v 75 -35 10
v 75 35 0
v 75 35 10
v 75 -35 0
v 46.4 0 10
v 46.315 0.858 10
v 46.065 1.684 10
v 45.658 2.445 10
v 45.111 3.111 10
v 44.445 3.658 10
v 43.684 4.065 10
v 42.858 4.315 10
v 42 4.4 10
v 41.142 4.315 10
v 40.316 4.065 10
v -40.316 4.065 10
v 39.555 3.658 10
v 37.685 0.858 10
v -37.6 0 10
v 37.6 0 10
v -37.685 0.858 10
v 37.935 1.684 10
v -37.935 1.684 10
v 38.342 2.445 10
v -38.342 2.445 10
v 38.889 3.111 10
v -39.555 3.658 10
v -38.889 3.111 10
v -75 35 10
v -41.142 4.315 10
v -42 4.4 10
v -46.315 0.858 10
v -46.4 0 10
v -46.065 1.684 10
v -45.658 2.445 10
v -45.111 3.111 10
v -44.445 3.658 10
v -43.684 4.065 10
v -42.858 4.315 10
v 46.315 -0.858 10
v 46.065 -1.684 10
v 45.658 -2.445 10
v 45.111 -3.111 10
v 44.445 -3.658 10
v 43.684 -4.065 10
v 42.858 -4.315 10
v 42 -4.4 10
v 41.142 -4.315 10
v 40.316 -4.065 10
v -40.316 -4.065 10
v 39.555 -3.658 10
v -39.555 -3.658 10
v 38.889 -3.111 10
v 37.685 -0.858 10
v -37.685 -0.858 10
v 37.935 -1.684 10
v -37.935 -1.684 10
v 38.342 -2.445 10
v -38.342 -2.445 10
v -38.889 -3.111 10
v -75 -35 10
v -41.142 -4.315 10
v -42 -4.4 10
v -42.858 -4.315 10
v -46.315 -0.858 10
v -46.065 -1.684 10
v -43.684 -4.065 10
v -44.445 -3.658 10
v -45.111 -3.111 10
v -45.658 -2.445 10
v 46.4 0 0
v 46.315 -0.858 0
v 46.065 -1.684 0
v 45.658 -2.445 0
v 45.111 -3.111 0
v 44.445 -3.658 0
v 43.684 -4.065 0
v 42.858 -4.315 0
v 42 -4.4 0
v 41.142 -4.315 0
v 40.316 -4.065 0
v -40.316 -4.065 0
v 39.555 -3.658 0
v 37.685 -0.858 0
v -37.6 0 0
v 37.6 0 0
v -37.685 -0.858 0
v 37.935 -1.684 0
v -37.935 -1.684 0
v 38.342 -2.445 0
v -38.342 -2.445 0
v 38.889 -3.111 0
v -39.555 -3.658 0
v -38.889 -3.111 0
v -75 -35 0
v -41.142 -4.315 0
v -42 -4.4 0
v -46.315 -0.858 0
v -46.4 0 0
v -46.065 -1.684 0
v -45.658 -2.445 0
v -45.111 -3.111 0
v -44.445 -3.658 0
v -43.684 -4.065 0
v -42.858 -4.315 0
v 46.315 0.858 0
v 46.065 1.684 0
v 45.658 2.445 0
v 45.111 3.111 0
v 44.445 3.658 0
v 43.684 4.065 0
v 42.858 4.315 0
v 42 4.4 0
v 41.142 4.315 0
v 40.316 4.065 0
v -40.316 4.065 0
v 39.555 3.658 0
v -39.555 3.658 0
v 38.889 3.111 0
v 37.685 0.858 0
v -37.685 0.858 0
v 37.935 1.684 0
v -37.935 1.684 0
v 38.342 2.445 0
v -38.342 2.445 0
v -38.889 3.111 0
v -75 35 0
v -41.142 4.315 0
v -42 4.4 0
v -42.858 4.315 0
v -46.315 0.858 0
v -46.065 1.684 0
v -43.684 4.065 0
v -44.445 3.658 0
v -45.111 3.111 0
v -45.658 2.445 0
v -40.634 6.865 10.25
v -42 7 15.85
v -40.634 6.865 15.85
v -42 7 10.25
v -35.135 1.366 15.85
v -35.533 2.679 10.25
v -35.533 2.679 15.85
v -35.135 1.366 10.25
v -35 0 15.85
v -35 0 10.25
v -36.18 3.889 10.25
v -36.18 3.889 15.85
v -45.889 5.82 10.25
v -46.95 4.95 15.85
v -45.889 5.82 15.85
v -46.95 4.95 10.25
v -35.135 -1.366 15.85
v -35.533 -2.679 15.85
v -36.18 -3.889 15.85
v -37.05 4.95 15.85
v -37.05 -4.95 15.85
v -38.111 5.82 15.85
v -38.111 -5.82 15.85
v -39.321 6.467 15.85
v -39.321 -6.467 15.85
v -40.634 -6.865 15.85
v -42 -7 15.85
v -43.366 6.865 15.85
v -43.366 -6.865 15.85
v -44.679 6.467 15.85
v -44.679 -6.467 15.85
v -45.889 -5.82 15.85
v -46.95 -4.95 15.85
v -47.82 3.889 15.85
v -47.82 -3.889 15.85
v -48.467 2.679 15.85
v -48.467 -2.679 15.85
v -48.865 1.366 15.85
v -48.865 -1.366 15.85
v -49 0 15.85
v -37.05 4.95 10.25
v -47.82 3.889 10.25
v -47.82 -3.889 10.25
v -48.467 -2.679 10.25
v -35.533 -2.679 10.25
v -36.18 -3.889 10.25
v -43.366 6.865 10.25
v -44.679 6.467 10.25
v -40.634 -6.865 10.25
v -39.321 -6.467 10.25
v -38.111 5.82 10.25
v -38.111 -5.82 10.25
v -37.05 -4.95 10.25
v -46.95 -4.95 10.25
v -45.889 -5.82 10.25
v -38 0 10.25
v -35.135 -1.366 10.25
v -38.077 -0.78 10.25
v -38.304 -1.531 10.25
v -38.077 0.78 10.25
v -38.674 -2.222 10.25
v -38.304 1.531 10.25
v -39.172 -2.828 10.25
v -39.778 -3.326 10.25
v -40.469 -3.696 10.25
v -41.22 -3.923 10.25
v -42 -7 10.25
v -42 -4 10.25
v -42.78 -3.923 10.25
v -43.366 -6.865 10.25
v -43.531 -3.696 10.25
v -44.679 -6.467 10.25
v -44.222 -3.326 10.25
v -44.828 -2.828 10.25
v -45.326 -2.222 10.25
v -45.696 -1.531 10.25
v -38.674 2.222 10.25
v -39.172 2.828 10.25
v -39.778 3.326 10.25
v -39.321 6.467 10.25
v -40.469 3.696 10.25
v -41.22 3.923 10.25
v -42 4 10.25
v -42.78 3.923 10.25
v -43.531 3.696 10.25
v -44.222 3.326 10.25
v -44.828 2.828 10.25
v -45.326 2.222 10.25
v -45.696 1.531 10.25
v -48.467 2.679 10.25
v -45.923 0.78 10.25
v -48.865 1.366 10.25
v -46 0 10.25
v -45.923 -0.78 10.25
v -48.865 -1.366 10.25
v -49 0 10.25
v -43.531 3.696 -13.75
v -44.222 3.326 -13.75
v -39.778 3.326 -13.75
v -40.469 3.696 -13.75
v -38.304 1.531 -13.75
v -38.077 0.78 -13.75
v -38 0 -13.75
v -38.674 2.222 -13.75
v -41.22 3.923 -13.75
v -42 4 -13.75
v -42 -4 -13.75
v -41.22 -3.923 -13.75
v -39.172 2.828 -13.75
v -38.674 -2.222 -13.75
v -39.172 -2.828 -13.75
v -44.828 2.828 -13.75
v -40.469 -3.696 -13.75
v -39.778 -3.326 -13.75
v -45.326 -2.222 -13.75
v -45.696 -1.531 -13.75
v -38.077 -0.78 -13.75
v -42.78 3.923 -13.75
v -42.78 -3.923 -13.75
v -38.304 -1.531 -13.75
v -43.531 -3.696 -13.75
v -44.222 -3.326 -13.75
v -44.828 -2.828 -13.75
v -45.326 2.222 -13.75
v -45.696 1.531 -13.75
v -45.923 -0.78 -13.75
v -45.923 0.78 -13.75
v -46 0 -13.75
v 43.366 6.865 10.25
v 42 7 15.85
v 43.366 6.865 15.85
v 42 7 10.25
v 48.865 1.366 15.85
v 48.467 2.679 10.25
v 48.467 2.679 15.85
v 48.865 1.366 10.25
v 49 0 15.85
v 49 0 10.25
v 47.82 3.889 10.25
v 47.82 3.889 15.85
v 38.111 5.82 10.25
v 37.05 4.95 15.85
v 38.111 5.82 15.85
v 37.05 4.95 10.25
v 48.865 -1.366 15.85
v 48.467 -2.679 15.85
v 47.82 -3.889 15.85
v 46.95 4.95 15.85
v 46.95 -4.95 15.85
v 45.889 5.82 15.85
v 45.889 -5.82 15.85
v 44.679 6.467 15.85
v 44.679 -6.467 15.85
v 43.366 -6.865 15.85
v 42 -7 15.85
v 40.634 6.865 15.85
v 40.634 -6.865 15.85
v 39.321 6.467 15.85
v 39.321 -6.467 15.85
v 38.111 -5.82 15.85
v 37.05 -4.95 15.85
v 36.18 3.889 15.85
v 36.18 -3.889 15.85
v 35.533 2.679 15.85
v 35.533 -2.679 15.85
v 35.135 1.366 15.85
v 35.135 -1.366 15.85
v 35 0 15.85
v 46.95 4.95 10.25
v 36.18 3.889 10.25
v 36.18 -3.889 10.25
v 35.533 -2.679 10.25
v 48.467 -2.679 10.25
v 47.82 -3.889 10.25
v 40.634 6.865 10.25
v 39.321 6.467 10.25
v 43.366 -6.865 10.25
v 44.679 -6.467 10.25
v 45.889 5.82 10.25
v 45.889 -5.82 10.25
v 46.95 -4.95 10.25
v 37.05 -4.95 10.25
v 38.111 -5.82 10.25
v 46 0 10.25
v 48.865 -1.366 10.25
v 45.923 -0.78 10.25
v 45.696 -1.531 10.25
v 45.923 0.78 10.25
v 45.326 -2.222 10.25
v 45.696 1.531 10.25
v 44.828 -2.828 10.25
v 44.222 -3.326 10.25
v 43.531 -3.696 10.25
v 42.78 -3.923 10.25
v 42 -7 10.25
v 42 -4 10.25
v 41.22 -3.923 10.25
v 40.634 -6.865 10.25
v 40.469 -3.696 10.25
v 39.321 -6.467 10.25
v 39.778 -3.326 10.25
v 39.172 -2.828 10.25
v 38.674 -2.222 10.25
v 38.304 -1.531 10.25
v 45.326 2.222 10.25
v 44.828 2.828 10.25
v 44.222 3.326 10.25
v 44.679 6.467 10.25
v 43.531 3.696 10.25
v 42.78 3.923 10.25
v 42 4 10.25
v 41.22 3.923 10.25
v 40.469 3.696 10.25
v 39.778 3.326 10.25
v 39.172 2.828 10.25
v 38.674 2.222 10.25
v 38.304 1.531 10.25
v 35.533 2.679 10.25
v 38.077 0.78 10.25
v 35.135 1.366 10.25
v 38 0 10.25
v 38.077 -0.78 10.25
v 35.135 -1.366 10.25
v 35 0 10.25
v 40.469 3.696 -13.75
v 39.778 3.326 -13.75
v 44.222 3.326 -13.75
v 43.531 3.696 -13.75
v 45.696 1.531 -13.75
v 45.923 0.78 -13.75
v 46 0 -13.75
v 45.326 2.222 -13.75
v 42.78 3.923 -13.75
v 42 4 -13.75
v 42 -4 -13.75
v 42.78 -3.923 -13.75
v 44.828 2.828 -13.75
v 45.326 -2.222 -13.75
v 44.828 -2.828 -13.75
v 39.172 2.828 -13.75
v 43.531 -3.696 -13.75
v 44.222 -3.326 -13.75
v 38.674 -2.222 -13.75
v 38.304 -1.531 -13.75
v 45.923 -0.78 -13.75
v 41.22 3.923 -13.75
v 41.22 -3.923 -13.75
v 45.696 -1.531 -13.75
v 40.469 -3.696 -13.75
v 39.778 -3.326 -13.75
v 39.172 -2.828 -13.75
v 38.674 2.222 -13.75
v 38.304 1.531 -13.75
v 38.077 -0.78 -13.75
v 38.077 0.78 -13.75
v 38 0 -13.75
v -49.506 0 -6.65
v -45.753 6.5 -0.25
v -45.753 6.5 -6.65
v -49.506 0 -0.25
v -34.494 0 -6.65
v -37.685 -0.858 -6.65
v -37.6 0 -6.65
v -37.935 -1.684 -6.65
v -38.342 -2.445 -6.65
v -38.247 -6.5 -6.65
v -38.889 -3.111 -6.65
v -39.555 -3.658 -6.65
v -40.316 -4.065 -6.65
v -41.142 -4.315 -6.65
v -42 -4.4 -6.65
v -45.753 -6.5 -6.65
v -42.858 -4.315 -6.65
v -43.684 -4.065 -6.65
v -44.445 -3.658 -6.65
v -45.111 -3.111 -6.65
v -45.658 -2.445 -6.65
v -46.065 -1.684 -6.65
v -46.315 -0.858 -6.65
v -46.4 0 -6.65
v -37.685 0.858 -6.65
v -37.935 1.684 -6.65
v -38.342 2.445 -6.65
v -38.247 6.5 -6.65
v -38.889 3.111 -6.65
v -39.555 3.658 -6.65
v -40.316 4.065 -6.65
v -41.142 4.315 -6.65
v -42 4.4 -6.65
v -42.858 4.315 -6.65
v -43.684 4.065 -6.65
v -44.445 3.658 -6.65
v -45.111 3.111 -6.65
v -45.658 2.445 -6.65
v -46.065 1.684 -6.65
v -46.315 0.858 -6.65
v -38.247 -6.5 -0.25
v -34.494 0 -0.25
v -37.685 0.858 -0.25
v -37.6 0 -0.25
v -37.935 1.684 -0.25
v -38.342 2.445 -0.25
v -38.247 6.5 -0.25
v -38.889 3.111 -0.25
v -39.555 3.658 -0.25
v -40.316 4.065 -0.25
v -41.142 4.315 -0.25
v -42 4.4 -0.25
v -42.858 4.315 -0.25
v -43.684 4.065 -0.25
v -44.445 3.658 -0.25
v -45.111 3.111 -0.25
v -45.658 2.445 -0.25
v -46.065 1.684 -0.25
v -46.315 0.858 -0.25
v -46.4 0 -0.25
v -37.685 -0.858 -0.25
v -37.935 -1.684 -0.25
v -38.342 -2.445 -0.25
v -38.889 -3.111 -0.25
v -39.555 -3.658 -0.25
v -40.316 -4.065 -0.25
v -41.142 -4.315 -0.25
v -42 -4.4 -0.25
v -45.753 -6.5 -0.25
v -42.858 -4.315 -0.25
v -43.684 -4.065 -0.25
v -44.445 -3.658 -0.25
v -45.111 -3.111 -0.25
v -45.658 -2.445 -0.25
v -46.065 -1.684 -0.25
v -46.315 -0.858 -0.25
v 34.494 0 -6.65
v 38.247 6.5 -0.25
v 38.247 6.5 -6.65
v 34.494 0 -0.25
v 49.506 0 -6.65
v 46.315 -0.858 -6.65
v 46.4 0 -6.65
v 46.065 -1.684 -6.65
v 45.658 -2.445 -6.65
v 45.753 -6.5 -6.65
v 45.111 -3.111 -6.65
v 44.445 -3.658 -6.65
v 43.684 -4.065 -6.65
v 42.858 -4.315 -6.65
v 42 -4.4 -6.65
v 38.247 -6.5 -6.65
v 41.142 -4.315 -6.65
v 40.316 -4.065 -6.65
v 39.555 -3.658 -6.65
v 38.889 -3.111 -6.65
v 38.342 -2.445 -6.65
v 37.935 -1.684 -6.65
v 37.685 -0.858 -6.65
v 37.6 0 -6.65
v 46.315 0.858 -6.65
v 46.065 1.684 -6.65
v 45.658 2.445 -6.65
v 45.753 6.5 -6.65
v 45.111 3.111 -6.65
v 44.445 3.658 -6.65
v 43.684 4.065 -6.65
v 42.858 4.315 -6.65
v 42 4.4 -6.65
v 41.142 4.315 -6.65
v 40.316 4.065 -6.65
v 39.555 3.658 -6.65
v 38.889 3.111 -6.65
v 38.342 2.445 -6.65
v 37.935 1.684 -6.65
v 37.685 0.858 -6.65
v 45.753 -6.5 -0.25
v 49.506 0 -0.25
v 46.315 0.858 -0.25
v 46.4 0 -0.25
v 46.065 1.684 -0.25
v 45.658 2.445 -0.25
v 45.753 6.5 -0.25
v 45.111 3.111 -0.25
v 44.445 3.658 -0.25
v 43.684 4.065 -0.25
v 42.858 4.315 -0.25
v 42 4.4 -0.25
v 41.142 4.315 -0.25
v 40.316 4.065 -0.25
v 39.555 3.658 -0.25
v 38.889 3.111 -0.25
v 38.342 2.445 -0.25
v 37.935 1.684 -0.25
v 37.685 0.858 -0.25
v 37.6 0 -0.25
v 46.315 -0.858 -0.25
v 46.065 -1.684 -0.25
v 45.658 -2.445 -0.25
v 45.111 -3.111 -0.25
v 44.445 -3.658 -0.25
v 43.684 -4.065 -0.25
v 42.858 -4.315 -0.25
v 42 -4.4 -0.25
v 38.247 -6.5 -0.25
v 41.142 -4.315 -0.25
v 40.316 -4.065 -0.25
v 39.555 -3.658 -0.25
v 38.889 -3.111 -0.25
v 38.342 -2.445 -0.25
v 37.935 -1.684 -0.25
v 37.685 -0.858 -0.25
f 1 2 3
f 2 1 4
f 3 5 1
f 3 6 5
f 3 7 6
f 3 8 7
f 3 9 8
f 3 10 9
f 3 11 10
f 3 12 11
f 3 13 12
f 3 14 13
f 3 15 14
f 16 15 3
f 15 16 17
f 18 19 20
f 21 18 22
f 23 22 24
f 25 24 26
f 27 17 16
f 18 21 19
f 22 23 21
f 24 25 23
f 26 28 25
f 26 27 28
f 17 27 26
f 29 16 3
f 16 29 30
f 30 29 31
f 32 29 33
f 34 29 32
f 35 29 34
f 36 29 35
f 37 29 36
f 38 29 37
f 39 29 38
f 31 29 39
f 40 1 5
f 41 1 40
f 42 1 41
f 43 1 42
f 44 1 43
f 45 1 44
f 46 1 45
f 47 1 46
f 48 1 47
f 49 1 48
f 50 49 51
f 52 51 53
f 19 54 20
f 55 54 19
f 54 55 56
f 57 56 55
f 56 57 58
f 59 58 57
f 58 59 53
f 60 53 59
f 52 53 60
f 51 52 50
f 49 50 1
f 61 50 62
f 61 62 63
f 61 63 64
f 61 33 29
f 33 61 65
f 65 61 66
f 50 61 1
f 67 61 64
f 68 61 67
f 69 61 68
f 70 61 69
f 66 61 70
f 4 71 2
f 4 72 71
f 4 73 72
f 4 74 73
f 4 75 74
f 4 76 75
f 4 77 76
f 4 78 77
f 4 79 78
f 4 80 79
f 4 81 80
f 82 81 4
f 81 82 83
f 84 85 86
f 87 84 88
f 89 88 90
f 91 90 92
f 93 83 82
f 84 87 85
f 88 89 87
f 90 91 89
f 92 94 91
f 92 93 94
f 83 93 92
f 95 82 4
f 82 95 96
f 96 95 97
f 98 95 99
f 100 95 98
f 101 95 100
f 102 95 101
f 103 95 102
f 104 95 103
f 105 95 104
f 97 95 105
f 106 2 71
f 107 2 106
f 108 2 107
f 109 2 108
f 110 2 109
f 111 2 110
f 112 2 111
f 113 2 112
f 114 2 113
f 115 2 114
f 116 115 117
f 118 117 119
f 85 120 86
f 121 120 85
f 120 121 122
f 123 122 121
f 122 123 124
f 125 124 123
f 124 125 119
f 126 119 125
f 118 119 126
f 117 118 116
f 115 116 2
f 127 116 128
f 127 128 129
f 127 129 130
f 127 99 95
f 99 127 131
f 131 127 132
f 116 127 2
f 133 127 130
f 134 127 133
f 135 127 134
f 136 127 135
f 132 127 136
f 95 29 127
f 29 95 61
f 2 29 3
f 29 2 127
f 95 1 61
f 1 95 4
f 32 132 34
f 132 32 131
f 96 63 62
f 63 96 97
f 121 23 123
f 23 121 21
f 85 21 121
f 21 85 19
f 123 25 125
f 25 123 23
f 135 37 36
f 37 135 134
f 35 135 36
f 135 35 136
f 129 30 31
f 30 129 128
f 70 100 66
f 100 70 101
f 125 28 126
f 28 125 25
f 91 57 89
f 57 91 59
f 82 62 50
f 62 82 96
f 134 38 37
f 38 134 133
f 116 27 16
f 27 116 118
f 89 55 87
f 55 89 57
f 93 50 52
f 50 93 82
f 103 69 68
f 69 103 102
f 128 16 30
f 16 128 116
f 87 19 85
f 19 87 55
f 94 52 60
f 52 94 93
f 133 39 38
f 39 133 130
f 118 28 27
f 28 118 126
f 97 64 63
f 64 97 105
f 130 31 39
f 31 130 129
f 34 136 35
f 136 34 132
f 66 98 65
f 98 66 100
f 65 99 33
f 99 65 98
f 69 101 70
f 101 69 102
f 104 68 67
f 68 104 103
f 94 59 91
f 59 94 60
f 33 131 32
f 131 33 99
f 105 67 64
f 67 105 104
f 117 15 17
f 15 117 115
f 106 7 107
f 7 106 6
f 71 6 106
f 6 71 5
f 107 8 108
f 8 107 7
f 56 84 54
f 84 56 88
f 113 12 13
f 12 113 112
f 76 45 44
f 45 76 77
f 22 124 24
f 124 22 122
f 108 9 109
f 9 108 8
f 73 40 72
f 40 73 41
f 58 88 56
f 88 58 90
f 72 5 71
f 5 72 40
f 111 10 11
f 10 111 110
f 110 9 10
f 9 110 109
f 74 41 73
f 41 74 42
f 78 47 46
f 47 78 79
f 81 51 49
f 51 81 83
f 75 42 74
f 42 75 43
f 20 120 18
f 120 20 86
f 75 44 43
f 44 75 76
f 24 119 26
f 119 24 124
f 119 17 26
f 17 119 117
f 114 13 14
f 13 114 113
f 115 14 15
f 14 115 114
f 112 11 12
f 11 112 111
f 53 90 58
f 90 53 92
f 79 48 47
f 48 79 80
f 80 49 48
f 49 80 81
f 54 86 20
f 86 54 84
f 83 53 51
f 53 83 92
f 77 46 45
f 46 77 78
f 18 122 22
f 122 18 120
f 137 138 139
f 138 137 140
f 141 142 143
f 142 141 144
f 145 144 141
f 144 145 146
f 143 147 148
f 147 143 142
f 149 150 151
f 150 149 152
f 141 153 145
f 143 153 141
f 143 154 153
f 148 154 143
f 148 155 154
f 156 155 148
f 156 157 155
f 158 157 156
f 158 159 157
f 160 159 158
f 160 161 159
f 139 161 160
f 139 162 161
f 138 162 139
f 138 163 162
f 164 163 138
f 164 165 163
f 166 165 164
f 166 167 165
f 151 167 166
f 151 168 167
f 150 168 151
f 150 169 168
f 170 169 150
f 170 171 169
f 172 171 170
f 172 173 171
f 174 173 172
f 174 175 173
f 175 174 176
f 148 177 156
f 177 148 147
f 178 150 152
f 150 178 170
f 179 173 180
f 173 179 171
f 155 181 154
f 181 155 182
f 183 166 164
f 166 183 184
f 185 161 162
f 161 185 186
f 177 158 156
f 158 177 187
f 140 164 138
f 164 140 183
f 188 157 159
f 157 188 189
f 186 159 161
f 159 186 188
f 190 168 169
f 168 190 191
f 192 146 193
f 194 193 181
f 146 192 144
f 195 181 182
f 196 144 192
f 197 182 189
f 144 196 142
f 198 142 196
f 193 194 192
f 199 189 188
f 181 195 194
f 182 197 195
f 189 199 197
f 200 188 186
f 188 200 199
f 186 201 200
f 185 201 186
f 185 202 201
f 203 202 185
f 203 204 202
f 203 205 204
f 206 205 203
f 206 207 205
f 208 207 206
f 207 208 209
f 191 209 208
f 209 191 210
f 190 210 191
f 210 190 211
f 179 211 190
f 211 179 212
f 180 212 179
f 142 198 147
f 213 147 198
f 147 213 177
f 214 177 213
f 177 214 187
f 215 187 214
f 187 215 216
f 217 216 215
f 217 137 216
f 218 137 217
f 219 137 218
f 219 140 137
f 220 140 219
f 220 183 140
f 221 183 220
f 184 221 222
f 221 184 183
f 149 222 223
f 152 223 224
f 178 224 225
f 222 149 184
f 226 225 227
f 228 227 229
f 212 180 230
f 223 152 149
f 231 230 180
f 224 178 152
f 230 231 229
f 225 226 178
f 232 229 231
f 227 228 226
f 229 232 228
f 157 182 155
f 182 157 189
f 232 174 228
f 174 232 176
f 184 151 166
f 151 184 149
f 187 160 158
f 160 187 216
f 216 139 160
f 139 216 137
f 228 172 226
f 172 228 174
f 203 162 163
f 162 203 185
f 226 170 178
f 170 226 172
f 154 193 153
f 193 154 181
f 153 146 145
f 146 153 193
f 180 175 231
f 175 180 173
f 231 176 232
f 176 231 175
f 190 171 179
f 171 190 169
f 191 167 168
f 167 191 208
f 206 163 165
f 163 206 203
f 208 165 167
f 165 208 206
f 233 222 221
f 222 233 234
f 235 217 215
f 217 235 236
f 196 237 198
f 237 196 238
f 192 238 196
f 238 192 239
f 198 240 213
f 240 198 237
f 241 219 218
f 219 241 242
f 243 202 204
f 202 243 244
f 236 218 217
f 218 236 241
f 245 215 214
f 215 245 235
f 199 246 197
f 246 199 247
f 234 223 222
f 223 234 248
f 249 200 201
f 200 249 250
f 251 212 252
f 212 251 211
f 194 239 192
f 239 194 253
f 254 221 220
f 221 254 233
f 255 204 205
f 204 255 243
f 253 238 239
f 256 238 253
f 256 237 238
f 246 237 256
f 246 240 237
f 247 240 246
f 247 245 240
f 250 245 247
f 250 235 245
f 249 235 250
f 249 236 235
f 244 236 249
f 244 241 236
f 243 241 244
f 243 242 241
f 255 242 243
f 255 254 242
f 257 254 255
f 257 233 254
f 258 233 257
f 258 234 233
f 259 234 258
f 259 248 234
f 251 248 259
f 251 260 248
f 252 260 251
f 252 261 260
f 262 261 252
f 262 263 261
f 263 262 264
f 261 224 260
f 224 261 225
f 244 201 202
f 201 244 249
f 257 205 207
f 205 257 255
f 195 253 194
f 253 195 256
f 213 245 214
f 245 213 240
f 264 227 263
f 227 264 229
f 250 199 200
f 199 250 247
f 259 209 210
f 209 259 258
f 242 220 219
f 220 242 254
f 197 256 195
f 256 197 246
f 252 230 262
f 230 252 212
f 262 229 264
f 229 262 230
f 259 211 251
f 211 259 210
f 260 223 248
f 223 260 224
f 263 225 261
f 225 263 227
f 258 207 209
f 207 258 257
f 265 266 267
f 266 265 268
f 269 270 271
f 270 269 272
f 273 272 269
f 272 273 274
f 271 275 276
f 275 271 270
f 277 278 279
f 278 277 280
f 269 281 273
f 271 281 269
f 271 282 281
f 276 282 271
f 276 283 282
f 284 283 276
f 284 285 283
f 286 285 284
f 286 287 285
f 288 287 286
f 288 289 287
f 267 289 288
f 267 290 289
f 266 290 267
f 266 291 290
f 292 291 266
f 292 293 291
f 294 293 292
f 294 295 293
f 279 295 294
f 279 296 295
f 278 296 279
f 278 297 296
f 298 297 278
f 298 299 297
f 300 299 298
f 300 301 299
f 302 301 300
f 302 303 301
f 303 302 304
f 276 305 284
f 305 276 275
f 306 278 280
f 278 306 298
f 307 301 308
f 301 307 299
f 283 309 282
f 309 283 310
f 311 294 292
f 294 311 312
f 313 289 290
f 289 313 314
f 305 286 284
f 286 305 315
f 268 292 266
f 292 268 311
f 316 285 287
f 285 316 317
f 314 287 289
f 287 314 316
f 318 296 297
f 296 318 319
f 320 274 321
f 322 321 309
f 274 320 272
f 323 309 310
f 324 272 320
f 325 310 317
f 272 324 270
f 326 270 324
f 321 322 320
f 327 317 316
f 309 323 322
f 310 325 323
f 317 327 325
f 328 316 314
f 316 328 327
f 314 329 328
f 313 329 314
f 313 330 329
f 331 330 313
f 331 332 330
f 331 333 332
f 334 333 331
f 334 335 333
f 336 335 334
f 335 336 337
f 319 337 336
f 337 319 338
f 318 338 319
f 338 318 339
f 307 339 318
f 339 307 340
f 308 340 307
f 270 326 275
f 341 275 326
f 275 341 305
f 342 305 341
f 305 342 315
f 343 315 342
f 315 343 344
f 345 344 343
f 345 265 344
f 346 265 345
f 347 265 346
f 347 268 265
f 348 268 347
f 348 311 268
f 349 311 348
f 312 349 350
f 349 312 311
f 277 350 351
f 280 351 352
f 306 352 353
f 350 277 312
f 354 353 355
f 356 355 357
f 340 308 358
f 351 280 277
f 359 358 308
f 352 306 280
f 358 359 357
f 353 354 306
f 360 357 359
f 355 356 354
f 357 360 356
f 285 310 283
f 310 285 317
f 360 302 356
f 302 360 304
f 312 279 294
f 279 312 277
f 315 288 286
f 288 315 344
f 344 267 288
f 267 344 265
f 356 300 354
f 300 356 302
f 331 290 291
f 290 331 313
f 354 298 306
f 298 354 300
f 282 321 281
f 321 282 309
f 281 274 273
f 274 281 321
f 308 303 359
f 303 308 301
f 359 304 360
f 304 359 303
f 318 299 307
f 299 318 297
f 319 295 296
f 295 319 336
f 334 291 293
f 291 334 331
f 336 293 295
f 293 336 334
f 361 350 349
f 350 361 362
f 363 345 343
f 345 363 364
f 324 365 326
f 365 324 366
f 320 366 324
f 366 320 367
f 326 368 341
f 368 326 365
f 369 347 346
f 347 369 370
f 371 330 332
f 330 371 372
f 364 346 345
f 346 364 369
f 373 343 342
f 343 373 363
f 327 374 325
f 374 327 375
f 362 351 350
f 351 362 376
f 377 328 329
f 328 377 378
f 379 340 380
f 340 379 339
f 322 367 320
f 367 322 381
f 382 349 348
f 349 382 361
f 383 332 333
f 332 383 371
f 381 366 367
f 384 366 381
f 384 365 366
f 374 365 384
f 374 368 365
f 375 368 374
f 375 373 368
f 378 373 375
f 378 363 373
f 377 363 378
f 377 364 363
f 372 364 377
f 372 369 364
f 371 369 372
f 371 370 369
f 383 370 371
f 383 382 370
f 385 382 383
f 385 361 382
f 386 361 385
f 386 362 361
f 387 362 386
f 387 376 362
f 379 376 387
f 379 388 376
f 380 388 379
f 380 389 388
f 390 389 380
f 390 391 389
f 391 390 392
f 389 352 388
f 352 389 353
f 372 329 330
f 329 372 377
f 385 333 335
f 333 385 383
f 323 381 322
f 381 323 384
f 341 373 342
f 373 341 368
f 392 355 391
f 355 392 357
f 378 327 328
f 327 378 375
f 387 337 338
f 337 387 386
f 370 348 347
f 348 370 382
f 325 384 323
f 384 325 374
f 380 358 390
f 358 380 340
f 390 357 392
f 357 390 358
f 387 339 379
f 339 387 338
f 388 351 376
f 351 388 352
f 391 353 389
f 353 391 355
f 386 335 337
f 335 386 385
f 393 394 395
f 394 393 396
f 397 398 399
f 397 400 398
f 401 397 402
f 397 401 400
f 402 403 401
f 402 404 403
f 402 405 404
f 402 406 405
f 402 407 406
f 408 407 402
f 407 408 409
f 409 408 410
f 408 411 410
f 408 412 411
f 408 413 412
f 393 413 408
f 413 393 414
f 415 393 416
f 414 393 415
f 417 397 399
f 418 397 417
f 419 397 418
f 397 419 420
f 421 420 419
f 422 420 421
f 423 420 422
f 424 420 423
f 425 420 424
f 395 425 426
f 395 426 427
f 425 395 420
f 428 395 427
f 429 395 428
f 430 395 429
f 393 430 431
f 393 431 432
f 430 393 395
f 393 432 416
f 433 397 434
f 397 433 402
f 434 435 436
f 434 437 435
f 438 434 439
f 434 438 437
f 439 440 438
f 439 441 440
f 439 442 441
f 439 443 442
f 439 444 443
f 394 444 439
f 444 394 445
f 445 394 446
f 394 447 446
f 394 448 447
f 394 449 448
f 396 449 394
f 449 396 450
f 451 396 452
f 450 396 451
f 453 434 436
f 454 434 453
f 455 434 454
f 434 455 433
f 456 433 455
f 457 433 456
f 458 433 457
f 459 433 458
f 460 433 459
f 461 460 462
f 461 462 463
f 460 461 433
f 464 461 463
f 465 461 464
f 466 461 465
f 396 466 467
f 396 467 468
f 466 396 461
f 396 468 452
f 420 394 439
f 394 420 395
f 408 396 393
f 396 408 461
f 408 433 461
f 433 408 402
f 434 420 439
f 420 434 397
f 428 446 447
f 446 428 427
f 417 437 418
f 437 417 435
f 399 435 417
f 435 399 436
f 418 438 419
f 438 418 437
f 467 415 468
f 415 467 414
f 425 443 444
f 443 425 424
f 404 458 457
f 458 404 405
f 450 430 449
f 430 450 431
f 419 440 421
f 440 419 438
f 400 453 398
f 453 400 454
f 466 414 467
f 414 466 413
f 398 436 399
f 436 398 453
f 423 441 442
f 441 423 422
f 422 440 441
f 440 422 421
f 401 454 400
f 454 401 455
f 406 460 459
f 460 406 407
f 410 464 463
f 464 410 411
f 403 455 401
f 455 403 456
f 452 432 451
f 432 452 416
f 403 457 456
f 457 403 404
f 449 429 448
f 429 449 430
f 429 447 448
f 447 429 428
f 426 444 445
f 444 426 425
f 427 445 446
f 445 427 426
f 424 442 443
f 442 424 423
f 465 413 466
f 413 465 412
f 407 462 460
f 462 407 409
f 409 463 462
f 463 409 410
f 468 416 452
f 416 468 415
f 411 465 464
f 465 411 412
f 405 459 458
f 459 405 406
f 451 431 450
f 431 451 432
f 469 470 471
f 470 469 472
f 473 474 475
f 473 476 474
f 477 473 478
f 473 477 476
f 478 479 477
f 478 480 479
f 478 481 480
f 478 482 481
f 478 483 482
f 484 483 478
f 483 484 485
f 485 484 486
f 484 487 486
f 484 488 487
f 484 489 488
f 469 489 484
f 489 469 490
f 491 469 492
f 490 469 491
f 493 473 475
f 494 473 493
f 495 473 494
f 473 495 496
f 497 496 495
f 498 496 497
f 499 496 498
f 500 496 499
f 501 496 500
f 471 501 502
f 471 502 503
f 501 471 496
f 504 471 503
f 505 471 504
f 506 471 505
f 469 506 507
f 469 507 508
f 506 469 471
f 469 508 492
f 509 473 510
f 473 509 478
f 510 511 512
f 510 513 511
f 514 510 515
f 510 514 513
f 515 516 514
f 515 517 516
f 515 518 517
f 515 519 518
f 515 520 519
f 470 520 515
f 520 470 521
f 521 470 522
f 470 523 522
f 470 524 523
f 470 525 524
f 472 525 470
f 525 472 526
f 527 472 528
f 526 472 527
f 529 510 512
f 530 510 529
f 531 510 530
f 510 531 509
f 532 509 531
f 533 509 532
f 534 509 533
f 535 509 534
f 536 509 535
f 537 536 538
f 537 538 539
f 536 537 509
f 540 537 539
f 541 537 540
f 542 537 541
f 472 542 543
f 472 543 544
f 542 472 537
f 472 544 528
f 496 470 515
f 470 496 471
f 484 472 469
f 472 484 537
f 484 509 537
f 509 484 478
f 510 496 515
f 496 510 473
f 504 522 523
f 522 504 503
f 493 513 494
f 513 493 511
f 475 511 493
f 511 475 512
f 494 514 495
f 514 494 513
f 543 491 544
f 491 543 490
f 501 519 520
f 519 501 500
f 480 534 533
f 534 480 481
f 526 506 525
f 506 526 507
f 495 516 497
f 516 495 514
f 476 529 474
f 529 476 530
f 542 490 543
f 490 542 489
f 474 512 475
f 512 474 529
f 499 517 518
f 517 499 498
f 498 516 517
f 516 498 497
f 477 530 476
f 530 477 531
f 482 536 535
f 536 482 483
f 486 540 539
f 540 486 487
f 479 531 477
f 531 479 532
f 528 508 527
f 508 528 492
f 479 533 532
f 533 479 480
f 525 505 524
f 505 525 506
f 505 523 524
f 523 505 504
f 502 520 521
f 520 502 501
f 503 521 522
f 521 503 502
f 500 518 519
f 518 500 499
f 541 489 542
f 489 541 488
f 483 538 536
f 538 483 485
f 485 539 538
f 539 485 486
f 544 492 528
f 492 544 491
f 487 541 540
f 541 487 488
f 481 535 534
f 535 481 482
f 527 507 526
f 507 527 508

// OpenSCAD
$fn = 32;

// ------------------------------------------------------------------------
// Bolted plate: 150 x 70 x 10 mm plate, 2 fasteners
// Every part is its own module, assembly() places them once.
// ------------------------------------------------------------------------

// --- part 1 ---
module plate() {
  difference() {
    translate([-75, -35, 0]) cube([150, 70, 10]);
    translate([-42, 0, -1]) cylinder(h = 12, d = 8.8);
    translate([42, 0, -1]) cylinder(h = 12, d = 8.8);
  }
}

// --- part 2 ---
module bolt1() {
  cylinder(h = 5.6, d = 14);
  translate([0, 0, -24]) cylinder(h = 24, d = 8);
}

// --- part 3 ---
module bolt2() {
  cylinder(h = 5.6, d = 14);
  translate([0, 0, -24]) cylinder(h = 24, d = 8);
}

// --- part 4 ---
module nut1() {
  difference() {
    linear_extrude(height = 6.4) polygon(points = [[7.506, 0], [3.753, 6.5], [-3.753, 6.5], [-7.506, 0], [-3.753, -6.5], [3.753, -6.5]]);
    translate([0, 0, -1]) cylinder(h = 8.4, d = 8.8);
  }
}

// --- part 5 ---
module nut2() {
  difference() {
    linear_extrude(height = 6.4) polygon(points = [[7.506, 0], [3.753, 6.5], [-3.753, 6.5], [-7.506, 0], [-3.753, -6.5], [3.753, -6.5]]);
    translate([0, 0, -1]) cylinder(h = 8.4, d = 8.8);
  }
}

// --- assembly ---
module assembly() {
  translate([0, 0, 0]) rotate([0, 0, 0]) plate();
  translate([-42, 0, 10.25]) rotate([0, 0, 0]) bolt1();
  translate([42, 0, 10.25]) rotate([0, 0, 0]) bolt2();
  translate([-42, 0, -6.65]) rotate([0, 0, 0]) nut1();
  translate([42, 0, -6.65]) rotate([0, 0, 0]) nut2();
}

assembly();
